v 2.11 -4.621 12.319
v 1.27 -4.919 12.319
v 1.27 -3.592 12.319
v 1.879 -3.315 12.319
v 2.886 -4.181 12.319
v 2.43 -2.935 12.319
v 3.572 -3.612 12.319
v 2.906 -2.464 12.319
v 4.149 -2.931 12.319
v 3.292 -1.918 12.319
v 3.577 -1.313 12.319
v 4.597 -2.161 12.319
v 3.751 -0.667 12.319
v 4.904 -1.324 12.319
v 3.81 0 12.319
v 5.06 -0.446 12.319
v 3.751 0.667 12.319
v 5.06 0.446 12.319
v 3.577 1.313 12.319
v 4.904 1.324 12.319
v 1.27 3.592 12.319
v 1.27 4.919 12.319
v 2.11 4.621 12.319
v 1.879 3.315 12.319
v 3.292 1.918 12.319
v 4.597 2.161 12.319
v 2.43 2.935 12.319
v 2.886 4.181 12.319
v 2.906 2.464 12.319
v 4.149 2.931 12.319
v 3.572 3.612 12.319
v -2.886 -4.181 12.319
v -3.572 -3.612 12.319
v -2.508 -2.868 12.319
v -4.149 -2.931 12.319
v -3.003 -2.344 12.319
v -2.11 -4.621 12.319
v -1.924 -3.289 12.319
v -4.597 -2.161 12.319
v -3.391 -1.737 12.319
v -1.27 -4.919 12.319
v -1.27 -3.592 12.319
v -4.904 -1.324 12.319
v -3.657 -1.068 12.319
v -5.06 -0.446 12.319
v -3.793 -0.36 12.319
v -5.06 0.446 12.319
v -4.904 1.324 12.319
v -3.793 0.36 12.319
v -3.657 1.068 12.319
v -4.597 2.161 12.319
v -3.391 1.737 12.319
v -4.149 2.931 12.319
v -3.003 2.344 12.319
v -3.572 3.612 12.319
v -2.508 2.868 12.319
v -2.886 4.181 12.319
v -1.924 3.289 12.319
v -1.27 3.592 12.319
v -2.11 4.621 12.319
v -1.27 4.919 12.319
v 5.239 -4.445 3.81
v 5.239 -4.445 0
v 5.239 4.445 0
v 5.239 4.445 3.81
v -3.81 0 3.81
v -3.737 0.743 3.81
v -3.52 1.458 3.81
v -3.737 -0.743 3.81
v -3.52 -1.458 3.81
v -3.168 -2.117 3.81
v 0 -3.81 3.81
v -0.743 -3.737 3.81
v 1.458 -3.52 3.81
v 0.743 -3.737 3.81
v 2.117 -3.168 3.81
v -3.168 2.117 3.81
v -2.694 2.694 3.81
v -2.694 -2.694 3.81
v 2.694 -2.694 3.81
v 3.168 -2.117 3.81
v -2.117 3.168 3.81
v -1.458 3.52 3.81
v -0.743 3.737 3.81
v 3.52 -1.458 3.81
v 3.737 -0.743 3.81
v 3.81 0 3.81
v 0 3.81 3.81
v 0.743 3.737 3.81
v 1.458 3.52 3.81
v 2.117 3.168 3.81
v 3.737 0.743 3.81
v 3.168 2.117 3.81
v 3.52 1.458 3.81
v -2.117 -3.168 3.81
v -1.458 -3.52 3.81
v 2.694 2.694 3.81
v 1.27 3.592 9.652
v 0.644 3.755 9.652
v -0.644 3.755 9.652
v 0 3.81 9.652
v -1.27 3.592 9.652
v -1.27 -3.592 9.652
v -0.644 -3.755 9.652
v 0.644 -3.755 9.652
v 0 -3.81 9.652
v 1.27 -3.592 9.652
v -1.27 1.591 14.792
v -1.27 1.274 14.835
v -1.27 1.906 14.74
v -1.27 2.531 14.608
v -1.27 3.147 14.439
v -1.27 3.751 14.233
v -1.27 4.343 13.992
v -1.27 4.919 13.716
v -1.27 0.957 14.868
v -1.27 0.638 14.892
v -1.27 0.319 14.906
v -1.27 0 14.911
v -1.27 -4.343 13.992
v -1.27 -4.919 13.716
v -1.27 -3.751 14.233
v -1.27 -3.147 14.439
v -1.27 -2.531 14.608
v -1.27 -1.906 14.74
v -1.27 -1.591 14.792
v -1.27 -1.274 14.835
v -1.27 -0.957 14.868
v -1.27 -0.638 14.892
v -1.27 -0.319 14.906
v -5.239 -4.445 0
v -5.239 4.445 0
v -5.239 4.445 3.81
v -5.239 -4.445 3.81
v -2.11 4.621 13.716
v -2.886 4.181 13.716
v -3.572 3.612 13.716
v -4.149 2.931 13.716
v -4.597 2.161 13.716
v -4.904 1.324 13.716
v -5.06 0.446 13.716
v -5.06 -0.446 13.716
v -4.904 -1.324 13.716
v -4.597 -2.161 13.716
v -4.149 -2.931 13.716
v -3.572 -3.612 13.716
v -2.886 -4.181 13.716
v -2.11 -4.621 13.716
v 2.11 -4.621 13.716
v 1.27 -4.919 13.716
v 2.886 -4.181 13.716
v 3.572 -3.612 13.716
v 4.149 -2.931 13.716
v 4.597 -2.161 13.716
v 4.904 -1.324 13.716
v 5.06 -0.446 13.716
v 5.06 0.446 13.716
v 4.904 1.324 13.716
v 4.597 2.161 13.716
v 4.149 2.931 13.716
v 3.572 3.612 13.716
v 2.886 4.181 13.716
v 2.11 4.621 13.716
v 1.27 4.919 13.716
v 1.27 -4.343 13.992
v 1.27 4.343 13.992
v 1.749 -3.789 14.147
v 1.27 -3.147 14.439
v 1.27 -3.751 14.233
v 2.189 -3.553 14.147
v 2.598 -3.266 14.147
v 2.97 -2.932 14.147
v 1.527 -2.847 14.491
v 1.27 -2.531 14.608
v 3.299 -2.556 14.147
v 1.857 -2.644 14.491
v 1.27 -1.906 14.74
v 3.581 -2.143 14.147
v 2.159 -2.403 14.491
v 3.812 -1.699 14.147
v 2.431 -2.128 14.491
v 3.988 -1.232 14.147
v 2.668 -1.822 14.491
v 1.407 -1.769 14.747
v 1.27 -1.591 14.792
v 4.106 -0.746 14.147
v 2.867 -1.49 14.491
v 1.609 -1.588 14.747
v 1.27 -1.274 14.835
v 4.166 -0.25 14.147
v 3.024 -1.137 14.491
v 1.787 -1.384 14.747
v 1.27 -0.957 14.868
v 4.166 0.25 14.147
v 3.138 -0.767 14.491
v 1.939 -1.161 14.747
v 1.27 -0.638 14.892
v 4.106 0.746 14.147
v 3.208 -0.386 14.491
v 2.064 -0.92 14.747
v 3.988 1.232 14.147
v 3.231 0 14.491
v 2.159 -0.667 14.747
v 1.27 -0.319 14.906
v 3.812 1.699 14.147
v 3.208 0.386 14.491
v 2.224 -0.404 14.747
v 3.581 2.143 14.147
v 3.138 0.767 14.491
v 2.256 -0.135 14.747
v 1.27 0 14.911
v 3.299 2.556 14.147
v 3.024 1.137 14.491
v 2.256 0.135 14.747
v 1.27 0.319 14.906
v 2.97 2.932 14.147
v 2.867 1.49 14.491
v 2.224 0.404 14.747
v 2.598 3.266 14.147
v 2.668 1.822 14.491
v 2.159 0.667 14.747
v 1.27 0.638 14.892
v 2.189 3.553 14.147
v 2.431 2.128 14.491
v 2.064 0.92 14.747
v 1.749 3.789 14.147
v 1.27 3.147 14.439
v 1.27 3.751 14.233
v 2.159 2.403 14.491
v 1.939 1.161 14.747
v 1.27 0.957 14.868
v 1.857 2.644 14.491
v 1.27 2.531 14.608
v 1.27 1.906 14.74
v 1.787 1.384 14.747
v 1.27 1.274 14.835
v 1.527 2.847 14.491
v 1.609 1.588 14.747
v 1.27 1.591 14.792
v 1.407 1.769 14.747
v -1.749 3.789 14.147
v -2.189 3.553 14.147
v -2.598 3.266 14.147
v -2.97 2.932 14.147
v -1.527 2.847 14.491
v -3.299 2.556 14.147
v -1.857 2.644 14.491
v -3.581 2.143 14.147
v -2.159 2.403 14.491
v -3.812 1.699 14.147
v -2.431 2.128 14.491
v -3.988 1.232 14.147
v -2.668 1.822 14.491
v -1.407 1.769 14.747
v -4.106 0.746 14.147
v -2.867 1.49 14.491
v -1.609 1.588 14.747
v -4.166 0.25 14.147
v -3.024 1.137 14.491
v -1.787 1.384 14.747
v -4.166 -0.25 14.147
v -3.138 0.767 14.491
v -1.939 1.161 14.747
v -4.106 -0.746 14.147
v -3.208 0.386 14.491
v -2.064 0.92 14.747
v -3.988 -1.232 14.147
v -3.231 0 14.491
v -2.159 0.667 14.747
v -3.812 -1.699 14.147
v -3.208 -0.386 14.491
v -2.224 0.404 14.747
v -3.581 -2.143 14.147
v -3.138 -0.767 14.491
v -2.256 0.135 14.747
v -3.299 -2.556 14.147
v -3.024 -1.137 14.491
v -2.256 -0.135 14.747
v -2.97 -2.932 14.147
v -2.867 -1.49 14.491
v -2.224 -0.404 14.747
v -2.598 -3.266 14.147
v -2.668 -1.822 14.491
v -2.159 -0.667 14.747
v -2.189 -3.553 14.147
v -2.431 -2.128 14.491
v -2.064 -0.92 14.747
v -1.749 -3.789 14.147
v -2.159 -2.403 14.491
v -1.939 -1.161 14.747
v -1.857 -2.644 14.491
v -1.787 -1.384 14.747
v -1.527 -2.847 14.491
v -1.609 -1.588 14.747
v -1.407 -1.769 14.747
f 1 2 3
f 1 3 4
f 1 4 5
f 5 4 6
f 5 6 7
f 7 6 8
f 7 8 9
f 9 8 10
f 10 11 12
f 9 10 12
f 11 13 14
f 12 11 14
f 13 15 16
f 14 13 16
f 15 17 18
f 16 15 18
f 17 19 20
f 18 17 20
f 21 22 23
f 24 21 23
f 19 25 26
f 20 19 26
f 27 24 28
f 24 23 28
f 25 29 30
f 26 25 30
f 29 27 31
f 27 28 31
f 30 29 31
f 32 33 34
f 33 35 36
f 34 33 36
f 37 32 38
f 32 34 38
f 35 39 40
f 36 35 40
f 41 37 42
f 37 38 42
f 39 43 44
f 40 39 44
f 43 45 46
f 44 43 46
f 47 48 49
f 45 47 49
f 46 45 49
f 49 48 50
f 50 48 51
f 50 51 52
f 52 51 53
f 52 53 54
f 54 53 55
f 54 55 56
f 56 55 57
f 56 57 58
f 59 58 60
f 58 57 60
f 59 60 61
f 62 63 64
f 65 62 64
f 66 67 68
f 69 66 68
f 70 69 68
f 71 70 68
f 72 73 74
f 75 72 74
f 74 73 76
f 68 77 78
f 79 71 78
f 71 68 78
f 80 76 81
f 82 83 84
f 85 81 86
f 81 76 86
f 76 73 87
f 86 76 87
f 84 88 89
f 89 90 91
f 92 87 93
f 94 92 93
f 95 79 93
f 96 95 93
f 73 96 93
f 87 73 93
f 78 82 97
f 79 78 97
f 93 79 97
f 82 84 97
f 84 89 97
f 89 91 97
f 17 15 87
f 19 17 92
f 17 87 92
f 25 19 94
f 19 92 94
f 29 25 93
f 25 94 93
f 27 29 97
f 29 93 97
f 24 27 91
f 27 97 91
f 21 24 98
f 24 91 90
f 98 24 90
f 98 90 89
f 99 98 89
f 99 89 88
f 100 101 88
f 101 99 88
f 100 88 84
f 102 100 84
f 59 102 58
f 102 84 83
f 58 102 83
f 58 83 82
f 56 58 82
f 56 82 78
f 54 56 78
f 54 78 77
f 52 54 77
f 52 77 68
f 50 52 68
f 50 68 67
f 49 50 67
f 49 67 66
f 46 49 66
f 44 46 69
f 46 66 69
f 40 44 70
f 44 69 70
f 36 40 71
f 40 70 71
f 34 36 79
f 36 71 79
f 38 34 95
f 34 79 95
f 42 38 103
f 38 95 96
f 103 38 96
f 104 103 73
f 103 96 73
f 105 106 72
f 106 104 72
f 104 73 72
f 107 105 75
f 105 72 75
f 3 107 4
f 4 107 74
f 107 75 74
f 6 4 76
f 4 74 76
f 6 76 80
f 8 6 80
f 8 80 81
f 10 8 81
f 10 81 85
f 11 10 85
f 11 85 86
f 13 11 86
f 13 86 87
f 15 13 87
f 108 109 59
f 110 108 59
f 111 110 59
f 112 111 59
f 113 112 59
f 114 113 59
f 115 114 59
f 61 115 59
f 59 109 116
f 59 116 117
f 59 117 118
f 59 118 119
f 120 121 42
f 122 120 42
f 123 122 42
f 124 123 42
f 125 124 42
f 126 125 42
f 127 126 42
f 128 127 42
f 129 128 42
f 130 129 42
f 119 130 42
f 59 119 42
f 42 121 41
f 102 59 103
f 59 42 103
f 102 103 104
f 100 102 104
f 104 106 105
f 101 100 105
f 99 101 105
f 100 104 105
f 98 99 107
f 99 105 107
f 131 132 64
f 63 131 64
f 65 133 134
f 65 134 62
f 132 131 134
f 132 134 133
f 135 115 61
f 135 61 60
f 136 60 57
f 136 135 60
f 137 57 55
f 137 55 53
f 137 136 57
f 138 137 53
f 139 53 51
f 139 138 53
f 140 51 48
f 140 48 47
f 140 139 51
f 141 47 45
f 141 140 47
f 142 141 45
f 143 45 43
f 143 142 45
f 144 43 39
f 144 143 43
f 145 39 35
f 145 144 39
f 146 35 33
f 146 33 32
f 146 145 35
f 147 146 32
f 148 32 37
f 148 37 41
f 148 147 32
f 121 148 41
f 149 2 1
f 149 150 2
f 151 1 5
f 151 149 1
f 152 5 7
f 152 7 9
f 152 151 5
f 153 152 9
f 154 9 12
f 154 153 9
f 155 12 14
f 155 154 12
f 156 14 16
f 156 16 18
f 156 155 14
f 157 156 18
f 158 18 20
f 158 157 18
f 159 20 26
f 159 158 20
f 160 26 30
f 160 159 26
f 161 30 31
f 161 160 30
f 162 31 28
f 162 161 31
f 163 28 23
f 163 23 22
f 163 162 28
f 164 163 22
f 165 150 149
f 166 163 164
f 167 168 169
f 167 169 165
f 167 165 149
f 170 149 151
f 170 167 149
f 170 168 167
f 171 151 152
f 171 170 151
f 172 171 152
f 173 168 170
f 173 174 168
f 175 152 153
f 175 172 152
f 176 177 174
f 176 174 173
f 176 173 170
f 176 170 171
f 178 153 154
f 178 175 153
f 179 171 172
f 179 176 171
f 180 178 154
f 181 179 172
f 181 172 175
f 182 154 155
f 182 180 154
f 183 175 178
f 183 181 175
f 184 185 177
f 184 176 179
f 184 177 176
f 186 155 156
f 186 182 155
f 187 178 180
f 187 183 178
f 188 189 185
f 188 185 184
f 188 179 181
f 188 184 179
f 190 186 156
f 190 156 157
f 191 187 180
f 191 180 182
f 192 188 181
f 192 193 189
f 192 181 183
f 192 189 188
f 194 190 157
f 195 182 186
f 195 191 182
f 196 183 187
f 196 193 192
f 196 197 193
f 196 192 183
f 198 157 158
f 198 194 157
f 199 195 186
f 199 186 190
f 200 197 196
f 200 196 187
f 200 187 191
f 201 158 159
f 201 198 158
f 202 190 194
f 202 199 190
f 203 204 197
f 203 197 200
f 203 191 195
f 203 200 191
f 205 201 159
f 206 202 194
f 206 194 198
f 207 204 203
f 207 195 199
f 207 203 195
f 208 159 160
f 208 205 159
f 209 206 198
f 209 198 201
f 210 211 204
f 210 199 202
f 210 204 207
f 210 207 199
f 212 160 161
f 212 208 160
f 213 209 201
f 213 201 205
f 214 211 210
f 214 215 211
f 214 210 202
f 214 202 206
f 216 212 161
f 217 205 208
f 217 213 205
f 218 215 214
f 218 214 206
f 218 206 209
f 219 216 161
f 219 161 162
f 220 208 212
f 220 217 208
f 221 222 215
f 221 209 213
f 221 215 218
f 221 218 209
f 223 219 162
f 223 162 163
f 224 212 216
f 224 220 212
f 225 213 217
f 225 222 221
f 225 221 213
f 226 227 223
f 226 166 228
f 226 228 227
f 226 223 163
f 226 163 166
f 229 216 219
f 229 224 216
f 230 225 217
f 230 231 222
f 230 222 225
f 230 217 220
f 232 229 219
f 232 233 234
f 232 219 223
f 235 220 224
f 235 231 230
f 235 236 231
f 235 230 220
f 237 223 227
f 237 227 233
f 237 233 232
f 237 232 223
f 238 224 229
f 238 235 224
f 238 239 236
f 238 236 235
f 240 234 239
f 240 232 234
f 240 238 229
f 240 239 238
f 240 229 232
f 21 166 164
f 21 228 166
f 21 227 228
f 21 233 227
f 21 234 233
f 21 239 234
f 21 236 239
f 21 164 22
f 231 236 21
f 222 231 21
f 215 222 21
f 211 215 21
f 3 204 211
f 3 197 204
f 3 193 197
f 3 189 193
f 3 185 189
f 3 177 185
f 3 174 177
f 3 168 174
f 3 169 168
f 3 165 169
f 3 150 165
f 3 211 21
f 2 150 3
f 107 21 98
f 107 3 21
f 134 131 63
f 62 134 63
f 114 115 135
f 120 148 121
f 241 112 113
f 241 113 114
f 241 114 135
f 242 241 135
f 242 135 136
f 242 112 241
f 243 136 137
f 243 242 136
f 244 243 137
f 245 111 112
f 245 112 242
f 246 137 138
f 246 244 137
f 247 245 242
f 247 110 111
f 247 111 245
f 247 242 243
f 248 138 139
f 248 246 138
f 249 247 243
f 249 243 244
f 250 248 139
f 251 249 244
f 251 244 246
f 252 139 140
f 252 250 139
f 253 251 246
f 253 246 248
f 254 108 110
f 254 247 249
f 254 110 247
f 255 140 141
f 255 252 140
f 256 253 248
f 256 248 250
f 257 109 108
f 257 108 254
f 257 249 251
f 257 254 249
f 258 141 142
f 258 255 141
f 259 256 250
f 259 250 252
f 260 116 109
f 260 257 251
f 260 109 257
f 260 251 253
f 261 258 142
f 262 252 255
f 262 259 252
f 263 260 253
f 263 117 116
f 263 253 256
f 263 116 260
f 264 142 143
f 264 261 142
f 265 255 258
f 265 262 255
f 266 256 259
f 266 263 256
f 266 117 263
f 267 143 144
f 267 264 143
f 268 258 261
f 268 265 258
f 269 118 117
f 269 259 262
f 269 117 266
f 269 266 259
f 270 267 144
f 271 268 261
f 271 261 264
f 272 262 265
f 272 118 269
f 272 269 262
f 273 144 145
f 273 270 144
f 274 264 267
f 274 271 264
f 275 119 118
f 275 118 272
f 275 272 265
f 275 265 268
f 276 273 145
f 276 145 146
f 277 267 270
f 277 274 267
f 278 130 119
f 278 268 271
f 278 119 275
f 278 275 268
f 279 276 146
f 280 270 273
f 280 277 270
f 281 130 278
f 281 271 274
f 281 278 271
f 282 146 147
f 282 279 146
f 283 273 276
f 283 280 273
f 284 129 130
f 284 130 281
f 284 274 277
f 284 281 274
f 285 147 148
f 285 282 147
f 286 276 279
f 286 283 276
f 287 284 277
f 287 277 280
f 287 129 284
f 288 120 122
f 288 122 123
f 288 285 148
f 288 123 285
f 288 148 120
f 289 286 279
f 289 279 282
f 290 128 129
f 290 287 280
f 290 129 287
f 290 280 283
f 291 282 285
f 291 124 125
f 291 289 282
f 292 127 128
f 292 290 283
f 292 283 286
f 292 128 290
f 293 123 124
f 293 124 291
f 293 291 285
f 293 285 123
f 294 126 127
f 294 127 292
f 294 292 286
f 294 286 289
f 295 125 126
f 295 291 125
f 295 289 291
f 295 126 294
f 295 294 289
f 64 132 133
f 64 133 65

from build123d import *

# Parameters (mm, degrees)
SKETCH1_W               = 10.4775
SKETCH1_H               = 8.89
BOSS_EXTRUDE1_DEPTH     = 3.81
SKETCH2_R               = 3.81
BOSS_EXTRUDE2_DEPTH     = 9.906
SKETCH3_R               = 5.08
BOSS_EXTRUDE3_DEPTH     = 1.397
CUT_EXTRUDE1_DEPTH      = 17.668266183
CUT_EXTRUDE1_DEPTH_BACK = 17.668266183
SKETCH4_W               = 2.54
SKETCH4_H               = 5.334


# Read off the part's stored shape, not the designer's step: Dome1
with BuildPart() as part:
    # Sketch1 → Boss-Extrude1 (new body)
    with BuildSketch(Plane.XY):
        Rectangle(SKETCH1_W, SKETCH1_H)
    extrude(amount=BOSS_EXTRUDE1_DEPTH)


with BuildPart() as body_2:
    # Sketch2 → Boss-Extrude2 (new body)
    with BuildSketch(Plane.XY.offset(3.81)):
        Circle(SKETCH2_R)
    extrude(amount=BOSS_EXTRUDE2_DEPTH)

    # Sketch3 → Boss-Extrude3 (add)
    with BuildSketch(Plane.XY.offset(13.716)):
        Circle(SKETCH3_R)
    extrude(amount=-BOSS_EXTRUDE3_DEPTH)

    # Dome1 outline → Dome1 (revolve)
    with BuildSketch(Plane.XZ):
        with BuildLine():
            Line((0, 13.716), (5.08000001, 13.715999995))
            ThreePointArc((5.08000001, 13.715999995), (2.618172078, 14.663688288), (0, 14.986))
            Line((0, 14.986), (0, 13.716))
        make_face()
    revolve(axis=Axis((0, 0, 0), (0, 0, 1)))

    # Sketch4 → Cut-Extrude1 (cut, two sides: drawn at the far end of the back side and taken through both)
    with BuildSketch(Plane(origin=(0, 0, 0), x_dir=(1, 0, 0), z_dir=(0, 1, 0)).offset(-CUT_EXTRUDE1_DEPTH_BACK)):
        with Locations((0, -12.319)):
            Rectangle(SKETCH4_W, SKETCH4_H)
    extrude(amount=CUT_EXTRUDE1_DEPTH + CUT_EXTRUDE1_DEPTH_BACK, mode=Mode.SUBTRACT)


solid = Compound([part.part, body_2.part])
